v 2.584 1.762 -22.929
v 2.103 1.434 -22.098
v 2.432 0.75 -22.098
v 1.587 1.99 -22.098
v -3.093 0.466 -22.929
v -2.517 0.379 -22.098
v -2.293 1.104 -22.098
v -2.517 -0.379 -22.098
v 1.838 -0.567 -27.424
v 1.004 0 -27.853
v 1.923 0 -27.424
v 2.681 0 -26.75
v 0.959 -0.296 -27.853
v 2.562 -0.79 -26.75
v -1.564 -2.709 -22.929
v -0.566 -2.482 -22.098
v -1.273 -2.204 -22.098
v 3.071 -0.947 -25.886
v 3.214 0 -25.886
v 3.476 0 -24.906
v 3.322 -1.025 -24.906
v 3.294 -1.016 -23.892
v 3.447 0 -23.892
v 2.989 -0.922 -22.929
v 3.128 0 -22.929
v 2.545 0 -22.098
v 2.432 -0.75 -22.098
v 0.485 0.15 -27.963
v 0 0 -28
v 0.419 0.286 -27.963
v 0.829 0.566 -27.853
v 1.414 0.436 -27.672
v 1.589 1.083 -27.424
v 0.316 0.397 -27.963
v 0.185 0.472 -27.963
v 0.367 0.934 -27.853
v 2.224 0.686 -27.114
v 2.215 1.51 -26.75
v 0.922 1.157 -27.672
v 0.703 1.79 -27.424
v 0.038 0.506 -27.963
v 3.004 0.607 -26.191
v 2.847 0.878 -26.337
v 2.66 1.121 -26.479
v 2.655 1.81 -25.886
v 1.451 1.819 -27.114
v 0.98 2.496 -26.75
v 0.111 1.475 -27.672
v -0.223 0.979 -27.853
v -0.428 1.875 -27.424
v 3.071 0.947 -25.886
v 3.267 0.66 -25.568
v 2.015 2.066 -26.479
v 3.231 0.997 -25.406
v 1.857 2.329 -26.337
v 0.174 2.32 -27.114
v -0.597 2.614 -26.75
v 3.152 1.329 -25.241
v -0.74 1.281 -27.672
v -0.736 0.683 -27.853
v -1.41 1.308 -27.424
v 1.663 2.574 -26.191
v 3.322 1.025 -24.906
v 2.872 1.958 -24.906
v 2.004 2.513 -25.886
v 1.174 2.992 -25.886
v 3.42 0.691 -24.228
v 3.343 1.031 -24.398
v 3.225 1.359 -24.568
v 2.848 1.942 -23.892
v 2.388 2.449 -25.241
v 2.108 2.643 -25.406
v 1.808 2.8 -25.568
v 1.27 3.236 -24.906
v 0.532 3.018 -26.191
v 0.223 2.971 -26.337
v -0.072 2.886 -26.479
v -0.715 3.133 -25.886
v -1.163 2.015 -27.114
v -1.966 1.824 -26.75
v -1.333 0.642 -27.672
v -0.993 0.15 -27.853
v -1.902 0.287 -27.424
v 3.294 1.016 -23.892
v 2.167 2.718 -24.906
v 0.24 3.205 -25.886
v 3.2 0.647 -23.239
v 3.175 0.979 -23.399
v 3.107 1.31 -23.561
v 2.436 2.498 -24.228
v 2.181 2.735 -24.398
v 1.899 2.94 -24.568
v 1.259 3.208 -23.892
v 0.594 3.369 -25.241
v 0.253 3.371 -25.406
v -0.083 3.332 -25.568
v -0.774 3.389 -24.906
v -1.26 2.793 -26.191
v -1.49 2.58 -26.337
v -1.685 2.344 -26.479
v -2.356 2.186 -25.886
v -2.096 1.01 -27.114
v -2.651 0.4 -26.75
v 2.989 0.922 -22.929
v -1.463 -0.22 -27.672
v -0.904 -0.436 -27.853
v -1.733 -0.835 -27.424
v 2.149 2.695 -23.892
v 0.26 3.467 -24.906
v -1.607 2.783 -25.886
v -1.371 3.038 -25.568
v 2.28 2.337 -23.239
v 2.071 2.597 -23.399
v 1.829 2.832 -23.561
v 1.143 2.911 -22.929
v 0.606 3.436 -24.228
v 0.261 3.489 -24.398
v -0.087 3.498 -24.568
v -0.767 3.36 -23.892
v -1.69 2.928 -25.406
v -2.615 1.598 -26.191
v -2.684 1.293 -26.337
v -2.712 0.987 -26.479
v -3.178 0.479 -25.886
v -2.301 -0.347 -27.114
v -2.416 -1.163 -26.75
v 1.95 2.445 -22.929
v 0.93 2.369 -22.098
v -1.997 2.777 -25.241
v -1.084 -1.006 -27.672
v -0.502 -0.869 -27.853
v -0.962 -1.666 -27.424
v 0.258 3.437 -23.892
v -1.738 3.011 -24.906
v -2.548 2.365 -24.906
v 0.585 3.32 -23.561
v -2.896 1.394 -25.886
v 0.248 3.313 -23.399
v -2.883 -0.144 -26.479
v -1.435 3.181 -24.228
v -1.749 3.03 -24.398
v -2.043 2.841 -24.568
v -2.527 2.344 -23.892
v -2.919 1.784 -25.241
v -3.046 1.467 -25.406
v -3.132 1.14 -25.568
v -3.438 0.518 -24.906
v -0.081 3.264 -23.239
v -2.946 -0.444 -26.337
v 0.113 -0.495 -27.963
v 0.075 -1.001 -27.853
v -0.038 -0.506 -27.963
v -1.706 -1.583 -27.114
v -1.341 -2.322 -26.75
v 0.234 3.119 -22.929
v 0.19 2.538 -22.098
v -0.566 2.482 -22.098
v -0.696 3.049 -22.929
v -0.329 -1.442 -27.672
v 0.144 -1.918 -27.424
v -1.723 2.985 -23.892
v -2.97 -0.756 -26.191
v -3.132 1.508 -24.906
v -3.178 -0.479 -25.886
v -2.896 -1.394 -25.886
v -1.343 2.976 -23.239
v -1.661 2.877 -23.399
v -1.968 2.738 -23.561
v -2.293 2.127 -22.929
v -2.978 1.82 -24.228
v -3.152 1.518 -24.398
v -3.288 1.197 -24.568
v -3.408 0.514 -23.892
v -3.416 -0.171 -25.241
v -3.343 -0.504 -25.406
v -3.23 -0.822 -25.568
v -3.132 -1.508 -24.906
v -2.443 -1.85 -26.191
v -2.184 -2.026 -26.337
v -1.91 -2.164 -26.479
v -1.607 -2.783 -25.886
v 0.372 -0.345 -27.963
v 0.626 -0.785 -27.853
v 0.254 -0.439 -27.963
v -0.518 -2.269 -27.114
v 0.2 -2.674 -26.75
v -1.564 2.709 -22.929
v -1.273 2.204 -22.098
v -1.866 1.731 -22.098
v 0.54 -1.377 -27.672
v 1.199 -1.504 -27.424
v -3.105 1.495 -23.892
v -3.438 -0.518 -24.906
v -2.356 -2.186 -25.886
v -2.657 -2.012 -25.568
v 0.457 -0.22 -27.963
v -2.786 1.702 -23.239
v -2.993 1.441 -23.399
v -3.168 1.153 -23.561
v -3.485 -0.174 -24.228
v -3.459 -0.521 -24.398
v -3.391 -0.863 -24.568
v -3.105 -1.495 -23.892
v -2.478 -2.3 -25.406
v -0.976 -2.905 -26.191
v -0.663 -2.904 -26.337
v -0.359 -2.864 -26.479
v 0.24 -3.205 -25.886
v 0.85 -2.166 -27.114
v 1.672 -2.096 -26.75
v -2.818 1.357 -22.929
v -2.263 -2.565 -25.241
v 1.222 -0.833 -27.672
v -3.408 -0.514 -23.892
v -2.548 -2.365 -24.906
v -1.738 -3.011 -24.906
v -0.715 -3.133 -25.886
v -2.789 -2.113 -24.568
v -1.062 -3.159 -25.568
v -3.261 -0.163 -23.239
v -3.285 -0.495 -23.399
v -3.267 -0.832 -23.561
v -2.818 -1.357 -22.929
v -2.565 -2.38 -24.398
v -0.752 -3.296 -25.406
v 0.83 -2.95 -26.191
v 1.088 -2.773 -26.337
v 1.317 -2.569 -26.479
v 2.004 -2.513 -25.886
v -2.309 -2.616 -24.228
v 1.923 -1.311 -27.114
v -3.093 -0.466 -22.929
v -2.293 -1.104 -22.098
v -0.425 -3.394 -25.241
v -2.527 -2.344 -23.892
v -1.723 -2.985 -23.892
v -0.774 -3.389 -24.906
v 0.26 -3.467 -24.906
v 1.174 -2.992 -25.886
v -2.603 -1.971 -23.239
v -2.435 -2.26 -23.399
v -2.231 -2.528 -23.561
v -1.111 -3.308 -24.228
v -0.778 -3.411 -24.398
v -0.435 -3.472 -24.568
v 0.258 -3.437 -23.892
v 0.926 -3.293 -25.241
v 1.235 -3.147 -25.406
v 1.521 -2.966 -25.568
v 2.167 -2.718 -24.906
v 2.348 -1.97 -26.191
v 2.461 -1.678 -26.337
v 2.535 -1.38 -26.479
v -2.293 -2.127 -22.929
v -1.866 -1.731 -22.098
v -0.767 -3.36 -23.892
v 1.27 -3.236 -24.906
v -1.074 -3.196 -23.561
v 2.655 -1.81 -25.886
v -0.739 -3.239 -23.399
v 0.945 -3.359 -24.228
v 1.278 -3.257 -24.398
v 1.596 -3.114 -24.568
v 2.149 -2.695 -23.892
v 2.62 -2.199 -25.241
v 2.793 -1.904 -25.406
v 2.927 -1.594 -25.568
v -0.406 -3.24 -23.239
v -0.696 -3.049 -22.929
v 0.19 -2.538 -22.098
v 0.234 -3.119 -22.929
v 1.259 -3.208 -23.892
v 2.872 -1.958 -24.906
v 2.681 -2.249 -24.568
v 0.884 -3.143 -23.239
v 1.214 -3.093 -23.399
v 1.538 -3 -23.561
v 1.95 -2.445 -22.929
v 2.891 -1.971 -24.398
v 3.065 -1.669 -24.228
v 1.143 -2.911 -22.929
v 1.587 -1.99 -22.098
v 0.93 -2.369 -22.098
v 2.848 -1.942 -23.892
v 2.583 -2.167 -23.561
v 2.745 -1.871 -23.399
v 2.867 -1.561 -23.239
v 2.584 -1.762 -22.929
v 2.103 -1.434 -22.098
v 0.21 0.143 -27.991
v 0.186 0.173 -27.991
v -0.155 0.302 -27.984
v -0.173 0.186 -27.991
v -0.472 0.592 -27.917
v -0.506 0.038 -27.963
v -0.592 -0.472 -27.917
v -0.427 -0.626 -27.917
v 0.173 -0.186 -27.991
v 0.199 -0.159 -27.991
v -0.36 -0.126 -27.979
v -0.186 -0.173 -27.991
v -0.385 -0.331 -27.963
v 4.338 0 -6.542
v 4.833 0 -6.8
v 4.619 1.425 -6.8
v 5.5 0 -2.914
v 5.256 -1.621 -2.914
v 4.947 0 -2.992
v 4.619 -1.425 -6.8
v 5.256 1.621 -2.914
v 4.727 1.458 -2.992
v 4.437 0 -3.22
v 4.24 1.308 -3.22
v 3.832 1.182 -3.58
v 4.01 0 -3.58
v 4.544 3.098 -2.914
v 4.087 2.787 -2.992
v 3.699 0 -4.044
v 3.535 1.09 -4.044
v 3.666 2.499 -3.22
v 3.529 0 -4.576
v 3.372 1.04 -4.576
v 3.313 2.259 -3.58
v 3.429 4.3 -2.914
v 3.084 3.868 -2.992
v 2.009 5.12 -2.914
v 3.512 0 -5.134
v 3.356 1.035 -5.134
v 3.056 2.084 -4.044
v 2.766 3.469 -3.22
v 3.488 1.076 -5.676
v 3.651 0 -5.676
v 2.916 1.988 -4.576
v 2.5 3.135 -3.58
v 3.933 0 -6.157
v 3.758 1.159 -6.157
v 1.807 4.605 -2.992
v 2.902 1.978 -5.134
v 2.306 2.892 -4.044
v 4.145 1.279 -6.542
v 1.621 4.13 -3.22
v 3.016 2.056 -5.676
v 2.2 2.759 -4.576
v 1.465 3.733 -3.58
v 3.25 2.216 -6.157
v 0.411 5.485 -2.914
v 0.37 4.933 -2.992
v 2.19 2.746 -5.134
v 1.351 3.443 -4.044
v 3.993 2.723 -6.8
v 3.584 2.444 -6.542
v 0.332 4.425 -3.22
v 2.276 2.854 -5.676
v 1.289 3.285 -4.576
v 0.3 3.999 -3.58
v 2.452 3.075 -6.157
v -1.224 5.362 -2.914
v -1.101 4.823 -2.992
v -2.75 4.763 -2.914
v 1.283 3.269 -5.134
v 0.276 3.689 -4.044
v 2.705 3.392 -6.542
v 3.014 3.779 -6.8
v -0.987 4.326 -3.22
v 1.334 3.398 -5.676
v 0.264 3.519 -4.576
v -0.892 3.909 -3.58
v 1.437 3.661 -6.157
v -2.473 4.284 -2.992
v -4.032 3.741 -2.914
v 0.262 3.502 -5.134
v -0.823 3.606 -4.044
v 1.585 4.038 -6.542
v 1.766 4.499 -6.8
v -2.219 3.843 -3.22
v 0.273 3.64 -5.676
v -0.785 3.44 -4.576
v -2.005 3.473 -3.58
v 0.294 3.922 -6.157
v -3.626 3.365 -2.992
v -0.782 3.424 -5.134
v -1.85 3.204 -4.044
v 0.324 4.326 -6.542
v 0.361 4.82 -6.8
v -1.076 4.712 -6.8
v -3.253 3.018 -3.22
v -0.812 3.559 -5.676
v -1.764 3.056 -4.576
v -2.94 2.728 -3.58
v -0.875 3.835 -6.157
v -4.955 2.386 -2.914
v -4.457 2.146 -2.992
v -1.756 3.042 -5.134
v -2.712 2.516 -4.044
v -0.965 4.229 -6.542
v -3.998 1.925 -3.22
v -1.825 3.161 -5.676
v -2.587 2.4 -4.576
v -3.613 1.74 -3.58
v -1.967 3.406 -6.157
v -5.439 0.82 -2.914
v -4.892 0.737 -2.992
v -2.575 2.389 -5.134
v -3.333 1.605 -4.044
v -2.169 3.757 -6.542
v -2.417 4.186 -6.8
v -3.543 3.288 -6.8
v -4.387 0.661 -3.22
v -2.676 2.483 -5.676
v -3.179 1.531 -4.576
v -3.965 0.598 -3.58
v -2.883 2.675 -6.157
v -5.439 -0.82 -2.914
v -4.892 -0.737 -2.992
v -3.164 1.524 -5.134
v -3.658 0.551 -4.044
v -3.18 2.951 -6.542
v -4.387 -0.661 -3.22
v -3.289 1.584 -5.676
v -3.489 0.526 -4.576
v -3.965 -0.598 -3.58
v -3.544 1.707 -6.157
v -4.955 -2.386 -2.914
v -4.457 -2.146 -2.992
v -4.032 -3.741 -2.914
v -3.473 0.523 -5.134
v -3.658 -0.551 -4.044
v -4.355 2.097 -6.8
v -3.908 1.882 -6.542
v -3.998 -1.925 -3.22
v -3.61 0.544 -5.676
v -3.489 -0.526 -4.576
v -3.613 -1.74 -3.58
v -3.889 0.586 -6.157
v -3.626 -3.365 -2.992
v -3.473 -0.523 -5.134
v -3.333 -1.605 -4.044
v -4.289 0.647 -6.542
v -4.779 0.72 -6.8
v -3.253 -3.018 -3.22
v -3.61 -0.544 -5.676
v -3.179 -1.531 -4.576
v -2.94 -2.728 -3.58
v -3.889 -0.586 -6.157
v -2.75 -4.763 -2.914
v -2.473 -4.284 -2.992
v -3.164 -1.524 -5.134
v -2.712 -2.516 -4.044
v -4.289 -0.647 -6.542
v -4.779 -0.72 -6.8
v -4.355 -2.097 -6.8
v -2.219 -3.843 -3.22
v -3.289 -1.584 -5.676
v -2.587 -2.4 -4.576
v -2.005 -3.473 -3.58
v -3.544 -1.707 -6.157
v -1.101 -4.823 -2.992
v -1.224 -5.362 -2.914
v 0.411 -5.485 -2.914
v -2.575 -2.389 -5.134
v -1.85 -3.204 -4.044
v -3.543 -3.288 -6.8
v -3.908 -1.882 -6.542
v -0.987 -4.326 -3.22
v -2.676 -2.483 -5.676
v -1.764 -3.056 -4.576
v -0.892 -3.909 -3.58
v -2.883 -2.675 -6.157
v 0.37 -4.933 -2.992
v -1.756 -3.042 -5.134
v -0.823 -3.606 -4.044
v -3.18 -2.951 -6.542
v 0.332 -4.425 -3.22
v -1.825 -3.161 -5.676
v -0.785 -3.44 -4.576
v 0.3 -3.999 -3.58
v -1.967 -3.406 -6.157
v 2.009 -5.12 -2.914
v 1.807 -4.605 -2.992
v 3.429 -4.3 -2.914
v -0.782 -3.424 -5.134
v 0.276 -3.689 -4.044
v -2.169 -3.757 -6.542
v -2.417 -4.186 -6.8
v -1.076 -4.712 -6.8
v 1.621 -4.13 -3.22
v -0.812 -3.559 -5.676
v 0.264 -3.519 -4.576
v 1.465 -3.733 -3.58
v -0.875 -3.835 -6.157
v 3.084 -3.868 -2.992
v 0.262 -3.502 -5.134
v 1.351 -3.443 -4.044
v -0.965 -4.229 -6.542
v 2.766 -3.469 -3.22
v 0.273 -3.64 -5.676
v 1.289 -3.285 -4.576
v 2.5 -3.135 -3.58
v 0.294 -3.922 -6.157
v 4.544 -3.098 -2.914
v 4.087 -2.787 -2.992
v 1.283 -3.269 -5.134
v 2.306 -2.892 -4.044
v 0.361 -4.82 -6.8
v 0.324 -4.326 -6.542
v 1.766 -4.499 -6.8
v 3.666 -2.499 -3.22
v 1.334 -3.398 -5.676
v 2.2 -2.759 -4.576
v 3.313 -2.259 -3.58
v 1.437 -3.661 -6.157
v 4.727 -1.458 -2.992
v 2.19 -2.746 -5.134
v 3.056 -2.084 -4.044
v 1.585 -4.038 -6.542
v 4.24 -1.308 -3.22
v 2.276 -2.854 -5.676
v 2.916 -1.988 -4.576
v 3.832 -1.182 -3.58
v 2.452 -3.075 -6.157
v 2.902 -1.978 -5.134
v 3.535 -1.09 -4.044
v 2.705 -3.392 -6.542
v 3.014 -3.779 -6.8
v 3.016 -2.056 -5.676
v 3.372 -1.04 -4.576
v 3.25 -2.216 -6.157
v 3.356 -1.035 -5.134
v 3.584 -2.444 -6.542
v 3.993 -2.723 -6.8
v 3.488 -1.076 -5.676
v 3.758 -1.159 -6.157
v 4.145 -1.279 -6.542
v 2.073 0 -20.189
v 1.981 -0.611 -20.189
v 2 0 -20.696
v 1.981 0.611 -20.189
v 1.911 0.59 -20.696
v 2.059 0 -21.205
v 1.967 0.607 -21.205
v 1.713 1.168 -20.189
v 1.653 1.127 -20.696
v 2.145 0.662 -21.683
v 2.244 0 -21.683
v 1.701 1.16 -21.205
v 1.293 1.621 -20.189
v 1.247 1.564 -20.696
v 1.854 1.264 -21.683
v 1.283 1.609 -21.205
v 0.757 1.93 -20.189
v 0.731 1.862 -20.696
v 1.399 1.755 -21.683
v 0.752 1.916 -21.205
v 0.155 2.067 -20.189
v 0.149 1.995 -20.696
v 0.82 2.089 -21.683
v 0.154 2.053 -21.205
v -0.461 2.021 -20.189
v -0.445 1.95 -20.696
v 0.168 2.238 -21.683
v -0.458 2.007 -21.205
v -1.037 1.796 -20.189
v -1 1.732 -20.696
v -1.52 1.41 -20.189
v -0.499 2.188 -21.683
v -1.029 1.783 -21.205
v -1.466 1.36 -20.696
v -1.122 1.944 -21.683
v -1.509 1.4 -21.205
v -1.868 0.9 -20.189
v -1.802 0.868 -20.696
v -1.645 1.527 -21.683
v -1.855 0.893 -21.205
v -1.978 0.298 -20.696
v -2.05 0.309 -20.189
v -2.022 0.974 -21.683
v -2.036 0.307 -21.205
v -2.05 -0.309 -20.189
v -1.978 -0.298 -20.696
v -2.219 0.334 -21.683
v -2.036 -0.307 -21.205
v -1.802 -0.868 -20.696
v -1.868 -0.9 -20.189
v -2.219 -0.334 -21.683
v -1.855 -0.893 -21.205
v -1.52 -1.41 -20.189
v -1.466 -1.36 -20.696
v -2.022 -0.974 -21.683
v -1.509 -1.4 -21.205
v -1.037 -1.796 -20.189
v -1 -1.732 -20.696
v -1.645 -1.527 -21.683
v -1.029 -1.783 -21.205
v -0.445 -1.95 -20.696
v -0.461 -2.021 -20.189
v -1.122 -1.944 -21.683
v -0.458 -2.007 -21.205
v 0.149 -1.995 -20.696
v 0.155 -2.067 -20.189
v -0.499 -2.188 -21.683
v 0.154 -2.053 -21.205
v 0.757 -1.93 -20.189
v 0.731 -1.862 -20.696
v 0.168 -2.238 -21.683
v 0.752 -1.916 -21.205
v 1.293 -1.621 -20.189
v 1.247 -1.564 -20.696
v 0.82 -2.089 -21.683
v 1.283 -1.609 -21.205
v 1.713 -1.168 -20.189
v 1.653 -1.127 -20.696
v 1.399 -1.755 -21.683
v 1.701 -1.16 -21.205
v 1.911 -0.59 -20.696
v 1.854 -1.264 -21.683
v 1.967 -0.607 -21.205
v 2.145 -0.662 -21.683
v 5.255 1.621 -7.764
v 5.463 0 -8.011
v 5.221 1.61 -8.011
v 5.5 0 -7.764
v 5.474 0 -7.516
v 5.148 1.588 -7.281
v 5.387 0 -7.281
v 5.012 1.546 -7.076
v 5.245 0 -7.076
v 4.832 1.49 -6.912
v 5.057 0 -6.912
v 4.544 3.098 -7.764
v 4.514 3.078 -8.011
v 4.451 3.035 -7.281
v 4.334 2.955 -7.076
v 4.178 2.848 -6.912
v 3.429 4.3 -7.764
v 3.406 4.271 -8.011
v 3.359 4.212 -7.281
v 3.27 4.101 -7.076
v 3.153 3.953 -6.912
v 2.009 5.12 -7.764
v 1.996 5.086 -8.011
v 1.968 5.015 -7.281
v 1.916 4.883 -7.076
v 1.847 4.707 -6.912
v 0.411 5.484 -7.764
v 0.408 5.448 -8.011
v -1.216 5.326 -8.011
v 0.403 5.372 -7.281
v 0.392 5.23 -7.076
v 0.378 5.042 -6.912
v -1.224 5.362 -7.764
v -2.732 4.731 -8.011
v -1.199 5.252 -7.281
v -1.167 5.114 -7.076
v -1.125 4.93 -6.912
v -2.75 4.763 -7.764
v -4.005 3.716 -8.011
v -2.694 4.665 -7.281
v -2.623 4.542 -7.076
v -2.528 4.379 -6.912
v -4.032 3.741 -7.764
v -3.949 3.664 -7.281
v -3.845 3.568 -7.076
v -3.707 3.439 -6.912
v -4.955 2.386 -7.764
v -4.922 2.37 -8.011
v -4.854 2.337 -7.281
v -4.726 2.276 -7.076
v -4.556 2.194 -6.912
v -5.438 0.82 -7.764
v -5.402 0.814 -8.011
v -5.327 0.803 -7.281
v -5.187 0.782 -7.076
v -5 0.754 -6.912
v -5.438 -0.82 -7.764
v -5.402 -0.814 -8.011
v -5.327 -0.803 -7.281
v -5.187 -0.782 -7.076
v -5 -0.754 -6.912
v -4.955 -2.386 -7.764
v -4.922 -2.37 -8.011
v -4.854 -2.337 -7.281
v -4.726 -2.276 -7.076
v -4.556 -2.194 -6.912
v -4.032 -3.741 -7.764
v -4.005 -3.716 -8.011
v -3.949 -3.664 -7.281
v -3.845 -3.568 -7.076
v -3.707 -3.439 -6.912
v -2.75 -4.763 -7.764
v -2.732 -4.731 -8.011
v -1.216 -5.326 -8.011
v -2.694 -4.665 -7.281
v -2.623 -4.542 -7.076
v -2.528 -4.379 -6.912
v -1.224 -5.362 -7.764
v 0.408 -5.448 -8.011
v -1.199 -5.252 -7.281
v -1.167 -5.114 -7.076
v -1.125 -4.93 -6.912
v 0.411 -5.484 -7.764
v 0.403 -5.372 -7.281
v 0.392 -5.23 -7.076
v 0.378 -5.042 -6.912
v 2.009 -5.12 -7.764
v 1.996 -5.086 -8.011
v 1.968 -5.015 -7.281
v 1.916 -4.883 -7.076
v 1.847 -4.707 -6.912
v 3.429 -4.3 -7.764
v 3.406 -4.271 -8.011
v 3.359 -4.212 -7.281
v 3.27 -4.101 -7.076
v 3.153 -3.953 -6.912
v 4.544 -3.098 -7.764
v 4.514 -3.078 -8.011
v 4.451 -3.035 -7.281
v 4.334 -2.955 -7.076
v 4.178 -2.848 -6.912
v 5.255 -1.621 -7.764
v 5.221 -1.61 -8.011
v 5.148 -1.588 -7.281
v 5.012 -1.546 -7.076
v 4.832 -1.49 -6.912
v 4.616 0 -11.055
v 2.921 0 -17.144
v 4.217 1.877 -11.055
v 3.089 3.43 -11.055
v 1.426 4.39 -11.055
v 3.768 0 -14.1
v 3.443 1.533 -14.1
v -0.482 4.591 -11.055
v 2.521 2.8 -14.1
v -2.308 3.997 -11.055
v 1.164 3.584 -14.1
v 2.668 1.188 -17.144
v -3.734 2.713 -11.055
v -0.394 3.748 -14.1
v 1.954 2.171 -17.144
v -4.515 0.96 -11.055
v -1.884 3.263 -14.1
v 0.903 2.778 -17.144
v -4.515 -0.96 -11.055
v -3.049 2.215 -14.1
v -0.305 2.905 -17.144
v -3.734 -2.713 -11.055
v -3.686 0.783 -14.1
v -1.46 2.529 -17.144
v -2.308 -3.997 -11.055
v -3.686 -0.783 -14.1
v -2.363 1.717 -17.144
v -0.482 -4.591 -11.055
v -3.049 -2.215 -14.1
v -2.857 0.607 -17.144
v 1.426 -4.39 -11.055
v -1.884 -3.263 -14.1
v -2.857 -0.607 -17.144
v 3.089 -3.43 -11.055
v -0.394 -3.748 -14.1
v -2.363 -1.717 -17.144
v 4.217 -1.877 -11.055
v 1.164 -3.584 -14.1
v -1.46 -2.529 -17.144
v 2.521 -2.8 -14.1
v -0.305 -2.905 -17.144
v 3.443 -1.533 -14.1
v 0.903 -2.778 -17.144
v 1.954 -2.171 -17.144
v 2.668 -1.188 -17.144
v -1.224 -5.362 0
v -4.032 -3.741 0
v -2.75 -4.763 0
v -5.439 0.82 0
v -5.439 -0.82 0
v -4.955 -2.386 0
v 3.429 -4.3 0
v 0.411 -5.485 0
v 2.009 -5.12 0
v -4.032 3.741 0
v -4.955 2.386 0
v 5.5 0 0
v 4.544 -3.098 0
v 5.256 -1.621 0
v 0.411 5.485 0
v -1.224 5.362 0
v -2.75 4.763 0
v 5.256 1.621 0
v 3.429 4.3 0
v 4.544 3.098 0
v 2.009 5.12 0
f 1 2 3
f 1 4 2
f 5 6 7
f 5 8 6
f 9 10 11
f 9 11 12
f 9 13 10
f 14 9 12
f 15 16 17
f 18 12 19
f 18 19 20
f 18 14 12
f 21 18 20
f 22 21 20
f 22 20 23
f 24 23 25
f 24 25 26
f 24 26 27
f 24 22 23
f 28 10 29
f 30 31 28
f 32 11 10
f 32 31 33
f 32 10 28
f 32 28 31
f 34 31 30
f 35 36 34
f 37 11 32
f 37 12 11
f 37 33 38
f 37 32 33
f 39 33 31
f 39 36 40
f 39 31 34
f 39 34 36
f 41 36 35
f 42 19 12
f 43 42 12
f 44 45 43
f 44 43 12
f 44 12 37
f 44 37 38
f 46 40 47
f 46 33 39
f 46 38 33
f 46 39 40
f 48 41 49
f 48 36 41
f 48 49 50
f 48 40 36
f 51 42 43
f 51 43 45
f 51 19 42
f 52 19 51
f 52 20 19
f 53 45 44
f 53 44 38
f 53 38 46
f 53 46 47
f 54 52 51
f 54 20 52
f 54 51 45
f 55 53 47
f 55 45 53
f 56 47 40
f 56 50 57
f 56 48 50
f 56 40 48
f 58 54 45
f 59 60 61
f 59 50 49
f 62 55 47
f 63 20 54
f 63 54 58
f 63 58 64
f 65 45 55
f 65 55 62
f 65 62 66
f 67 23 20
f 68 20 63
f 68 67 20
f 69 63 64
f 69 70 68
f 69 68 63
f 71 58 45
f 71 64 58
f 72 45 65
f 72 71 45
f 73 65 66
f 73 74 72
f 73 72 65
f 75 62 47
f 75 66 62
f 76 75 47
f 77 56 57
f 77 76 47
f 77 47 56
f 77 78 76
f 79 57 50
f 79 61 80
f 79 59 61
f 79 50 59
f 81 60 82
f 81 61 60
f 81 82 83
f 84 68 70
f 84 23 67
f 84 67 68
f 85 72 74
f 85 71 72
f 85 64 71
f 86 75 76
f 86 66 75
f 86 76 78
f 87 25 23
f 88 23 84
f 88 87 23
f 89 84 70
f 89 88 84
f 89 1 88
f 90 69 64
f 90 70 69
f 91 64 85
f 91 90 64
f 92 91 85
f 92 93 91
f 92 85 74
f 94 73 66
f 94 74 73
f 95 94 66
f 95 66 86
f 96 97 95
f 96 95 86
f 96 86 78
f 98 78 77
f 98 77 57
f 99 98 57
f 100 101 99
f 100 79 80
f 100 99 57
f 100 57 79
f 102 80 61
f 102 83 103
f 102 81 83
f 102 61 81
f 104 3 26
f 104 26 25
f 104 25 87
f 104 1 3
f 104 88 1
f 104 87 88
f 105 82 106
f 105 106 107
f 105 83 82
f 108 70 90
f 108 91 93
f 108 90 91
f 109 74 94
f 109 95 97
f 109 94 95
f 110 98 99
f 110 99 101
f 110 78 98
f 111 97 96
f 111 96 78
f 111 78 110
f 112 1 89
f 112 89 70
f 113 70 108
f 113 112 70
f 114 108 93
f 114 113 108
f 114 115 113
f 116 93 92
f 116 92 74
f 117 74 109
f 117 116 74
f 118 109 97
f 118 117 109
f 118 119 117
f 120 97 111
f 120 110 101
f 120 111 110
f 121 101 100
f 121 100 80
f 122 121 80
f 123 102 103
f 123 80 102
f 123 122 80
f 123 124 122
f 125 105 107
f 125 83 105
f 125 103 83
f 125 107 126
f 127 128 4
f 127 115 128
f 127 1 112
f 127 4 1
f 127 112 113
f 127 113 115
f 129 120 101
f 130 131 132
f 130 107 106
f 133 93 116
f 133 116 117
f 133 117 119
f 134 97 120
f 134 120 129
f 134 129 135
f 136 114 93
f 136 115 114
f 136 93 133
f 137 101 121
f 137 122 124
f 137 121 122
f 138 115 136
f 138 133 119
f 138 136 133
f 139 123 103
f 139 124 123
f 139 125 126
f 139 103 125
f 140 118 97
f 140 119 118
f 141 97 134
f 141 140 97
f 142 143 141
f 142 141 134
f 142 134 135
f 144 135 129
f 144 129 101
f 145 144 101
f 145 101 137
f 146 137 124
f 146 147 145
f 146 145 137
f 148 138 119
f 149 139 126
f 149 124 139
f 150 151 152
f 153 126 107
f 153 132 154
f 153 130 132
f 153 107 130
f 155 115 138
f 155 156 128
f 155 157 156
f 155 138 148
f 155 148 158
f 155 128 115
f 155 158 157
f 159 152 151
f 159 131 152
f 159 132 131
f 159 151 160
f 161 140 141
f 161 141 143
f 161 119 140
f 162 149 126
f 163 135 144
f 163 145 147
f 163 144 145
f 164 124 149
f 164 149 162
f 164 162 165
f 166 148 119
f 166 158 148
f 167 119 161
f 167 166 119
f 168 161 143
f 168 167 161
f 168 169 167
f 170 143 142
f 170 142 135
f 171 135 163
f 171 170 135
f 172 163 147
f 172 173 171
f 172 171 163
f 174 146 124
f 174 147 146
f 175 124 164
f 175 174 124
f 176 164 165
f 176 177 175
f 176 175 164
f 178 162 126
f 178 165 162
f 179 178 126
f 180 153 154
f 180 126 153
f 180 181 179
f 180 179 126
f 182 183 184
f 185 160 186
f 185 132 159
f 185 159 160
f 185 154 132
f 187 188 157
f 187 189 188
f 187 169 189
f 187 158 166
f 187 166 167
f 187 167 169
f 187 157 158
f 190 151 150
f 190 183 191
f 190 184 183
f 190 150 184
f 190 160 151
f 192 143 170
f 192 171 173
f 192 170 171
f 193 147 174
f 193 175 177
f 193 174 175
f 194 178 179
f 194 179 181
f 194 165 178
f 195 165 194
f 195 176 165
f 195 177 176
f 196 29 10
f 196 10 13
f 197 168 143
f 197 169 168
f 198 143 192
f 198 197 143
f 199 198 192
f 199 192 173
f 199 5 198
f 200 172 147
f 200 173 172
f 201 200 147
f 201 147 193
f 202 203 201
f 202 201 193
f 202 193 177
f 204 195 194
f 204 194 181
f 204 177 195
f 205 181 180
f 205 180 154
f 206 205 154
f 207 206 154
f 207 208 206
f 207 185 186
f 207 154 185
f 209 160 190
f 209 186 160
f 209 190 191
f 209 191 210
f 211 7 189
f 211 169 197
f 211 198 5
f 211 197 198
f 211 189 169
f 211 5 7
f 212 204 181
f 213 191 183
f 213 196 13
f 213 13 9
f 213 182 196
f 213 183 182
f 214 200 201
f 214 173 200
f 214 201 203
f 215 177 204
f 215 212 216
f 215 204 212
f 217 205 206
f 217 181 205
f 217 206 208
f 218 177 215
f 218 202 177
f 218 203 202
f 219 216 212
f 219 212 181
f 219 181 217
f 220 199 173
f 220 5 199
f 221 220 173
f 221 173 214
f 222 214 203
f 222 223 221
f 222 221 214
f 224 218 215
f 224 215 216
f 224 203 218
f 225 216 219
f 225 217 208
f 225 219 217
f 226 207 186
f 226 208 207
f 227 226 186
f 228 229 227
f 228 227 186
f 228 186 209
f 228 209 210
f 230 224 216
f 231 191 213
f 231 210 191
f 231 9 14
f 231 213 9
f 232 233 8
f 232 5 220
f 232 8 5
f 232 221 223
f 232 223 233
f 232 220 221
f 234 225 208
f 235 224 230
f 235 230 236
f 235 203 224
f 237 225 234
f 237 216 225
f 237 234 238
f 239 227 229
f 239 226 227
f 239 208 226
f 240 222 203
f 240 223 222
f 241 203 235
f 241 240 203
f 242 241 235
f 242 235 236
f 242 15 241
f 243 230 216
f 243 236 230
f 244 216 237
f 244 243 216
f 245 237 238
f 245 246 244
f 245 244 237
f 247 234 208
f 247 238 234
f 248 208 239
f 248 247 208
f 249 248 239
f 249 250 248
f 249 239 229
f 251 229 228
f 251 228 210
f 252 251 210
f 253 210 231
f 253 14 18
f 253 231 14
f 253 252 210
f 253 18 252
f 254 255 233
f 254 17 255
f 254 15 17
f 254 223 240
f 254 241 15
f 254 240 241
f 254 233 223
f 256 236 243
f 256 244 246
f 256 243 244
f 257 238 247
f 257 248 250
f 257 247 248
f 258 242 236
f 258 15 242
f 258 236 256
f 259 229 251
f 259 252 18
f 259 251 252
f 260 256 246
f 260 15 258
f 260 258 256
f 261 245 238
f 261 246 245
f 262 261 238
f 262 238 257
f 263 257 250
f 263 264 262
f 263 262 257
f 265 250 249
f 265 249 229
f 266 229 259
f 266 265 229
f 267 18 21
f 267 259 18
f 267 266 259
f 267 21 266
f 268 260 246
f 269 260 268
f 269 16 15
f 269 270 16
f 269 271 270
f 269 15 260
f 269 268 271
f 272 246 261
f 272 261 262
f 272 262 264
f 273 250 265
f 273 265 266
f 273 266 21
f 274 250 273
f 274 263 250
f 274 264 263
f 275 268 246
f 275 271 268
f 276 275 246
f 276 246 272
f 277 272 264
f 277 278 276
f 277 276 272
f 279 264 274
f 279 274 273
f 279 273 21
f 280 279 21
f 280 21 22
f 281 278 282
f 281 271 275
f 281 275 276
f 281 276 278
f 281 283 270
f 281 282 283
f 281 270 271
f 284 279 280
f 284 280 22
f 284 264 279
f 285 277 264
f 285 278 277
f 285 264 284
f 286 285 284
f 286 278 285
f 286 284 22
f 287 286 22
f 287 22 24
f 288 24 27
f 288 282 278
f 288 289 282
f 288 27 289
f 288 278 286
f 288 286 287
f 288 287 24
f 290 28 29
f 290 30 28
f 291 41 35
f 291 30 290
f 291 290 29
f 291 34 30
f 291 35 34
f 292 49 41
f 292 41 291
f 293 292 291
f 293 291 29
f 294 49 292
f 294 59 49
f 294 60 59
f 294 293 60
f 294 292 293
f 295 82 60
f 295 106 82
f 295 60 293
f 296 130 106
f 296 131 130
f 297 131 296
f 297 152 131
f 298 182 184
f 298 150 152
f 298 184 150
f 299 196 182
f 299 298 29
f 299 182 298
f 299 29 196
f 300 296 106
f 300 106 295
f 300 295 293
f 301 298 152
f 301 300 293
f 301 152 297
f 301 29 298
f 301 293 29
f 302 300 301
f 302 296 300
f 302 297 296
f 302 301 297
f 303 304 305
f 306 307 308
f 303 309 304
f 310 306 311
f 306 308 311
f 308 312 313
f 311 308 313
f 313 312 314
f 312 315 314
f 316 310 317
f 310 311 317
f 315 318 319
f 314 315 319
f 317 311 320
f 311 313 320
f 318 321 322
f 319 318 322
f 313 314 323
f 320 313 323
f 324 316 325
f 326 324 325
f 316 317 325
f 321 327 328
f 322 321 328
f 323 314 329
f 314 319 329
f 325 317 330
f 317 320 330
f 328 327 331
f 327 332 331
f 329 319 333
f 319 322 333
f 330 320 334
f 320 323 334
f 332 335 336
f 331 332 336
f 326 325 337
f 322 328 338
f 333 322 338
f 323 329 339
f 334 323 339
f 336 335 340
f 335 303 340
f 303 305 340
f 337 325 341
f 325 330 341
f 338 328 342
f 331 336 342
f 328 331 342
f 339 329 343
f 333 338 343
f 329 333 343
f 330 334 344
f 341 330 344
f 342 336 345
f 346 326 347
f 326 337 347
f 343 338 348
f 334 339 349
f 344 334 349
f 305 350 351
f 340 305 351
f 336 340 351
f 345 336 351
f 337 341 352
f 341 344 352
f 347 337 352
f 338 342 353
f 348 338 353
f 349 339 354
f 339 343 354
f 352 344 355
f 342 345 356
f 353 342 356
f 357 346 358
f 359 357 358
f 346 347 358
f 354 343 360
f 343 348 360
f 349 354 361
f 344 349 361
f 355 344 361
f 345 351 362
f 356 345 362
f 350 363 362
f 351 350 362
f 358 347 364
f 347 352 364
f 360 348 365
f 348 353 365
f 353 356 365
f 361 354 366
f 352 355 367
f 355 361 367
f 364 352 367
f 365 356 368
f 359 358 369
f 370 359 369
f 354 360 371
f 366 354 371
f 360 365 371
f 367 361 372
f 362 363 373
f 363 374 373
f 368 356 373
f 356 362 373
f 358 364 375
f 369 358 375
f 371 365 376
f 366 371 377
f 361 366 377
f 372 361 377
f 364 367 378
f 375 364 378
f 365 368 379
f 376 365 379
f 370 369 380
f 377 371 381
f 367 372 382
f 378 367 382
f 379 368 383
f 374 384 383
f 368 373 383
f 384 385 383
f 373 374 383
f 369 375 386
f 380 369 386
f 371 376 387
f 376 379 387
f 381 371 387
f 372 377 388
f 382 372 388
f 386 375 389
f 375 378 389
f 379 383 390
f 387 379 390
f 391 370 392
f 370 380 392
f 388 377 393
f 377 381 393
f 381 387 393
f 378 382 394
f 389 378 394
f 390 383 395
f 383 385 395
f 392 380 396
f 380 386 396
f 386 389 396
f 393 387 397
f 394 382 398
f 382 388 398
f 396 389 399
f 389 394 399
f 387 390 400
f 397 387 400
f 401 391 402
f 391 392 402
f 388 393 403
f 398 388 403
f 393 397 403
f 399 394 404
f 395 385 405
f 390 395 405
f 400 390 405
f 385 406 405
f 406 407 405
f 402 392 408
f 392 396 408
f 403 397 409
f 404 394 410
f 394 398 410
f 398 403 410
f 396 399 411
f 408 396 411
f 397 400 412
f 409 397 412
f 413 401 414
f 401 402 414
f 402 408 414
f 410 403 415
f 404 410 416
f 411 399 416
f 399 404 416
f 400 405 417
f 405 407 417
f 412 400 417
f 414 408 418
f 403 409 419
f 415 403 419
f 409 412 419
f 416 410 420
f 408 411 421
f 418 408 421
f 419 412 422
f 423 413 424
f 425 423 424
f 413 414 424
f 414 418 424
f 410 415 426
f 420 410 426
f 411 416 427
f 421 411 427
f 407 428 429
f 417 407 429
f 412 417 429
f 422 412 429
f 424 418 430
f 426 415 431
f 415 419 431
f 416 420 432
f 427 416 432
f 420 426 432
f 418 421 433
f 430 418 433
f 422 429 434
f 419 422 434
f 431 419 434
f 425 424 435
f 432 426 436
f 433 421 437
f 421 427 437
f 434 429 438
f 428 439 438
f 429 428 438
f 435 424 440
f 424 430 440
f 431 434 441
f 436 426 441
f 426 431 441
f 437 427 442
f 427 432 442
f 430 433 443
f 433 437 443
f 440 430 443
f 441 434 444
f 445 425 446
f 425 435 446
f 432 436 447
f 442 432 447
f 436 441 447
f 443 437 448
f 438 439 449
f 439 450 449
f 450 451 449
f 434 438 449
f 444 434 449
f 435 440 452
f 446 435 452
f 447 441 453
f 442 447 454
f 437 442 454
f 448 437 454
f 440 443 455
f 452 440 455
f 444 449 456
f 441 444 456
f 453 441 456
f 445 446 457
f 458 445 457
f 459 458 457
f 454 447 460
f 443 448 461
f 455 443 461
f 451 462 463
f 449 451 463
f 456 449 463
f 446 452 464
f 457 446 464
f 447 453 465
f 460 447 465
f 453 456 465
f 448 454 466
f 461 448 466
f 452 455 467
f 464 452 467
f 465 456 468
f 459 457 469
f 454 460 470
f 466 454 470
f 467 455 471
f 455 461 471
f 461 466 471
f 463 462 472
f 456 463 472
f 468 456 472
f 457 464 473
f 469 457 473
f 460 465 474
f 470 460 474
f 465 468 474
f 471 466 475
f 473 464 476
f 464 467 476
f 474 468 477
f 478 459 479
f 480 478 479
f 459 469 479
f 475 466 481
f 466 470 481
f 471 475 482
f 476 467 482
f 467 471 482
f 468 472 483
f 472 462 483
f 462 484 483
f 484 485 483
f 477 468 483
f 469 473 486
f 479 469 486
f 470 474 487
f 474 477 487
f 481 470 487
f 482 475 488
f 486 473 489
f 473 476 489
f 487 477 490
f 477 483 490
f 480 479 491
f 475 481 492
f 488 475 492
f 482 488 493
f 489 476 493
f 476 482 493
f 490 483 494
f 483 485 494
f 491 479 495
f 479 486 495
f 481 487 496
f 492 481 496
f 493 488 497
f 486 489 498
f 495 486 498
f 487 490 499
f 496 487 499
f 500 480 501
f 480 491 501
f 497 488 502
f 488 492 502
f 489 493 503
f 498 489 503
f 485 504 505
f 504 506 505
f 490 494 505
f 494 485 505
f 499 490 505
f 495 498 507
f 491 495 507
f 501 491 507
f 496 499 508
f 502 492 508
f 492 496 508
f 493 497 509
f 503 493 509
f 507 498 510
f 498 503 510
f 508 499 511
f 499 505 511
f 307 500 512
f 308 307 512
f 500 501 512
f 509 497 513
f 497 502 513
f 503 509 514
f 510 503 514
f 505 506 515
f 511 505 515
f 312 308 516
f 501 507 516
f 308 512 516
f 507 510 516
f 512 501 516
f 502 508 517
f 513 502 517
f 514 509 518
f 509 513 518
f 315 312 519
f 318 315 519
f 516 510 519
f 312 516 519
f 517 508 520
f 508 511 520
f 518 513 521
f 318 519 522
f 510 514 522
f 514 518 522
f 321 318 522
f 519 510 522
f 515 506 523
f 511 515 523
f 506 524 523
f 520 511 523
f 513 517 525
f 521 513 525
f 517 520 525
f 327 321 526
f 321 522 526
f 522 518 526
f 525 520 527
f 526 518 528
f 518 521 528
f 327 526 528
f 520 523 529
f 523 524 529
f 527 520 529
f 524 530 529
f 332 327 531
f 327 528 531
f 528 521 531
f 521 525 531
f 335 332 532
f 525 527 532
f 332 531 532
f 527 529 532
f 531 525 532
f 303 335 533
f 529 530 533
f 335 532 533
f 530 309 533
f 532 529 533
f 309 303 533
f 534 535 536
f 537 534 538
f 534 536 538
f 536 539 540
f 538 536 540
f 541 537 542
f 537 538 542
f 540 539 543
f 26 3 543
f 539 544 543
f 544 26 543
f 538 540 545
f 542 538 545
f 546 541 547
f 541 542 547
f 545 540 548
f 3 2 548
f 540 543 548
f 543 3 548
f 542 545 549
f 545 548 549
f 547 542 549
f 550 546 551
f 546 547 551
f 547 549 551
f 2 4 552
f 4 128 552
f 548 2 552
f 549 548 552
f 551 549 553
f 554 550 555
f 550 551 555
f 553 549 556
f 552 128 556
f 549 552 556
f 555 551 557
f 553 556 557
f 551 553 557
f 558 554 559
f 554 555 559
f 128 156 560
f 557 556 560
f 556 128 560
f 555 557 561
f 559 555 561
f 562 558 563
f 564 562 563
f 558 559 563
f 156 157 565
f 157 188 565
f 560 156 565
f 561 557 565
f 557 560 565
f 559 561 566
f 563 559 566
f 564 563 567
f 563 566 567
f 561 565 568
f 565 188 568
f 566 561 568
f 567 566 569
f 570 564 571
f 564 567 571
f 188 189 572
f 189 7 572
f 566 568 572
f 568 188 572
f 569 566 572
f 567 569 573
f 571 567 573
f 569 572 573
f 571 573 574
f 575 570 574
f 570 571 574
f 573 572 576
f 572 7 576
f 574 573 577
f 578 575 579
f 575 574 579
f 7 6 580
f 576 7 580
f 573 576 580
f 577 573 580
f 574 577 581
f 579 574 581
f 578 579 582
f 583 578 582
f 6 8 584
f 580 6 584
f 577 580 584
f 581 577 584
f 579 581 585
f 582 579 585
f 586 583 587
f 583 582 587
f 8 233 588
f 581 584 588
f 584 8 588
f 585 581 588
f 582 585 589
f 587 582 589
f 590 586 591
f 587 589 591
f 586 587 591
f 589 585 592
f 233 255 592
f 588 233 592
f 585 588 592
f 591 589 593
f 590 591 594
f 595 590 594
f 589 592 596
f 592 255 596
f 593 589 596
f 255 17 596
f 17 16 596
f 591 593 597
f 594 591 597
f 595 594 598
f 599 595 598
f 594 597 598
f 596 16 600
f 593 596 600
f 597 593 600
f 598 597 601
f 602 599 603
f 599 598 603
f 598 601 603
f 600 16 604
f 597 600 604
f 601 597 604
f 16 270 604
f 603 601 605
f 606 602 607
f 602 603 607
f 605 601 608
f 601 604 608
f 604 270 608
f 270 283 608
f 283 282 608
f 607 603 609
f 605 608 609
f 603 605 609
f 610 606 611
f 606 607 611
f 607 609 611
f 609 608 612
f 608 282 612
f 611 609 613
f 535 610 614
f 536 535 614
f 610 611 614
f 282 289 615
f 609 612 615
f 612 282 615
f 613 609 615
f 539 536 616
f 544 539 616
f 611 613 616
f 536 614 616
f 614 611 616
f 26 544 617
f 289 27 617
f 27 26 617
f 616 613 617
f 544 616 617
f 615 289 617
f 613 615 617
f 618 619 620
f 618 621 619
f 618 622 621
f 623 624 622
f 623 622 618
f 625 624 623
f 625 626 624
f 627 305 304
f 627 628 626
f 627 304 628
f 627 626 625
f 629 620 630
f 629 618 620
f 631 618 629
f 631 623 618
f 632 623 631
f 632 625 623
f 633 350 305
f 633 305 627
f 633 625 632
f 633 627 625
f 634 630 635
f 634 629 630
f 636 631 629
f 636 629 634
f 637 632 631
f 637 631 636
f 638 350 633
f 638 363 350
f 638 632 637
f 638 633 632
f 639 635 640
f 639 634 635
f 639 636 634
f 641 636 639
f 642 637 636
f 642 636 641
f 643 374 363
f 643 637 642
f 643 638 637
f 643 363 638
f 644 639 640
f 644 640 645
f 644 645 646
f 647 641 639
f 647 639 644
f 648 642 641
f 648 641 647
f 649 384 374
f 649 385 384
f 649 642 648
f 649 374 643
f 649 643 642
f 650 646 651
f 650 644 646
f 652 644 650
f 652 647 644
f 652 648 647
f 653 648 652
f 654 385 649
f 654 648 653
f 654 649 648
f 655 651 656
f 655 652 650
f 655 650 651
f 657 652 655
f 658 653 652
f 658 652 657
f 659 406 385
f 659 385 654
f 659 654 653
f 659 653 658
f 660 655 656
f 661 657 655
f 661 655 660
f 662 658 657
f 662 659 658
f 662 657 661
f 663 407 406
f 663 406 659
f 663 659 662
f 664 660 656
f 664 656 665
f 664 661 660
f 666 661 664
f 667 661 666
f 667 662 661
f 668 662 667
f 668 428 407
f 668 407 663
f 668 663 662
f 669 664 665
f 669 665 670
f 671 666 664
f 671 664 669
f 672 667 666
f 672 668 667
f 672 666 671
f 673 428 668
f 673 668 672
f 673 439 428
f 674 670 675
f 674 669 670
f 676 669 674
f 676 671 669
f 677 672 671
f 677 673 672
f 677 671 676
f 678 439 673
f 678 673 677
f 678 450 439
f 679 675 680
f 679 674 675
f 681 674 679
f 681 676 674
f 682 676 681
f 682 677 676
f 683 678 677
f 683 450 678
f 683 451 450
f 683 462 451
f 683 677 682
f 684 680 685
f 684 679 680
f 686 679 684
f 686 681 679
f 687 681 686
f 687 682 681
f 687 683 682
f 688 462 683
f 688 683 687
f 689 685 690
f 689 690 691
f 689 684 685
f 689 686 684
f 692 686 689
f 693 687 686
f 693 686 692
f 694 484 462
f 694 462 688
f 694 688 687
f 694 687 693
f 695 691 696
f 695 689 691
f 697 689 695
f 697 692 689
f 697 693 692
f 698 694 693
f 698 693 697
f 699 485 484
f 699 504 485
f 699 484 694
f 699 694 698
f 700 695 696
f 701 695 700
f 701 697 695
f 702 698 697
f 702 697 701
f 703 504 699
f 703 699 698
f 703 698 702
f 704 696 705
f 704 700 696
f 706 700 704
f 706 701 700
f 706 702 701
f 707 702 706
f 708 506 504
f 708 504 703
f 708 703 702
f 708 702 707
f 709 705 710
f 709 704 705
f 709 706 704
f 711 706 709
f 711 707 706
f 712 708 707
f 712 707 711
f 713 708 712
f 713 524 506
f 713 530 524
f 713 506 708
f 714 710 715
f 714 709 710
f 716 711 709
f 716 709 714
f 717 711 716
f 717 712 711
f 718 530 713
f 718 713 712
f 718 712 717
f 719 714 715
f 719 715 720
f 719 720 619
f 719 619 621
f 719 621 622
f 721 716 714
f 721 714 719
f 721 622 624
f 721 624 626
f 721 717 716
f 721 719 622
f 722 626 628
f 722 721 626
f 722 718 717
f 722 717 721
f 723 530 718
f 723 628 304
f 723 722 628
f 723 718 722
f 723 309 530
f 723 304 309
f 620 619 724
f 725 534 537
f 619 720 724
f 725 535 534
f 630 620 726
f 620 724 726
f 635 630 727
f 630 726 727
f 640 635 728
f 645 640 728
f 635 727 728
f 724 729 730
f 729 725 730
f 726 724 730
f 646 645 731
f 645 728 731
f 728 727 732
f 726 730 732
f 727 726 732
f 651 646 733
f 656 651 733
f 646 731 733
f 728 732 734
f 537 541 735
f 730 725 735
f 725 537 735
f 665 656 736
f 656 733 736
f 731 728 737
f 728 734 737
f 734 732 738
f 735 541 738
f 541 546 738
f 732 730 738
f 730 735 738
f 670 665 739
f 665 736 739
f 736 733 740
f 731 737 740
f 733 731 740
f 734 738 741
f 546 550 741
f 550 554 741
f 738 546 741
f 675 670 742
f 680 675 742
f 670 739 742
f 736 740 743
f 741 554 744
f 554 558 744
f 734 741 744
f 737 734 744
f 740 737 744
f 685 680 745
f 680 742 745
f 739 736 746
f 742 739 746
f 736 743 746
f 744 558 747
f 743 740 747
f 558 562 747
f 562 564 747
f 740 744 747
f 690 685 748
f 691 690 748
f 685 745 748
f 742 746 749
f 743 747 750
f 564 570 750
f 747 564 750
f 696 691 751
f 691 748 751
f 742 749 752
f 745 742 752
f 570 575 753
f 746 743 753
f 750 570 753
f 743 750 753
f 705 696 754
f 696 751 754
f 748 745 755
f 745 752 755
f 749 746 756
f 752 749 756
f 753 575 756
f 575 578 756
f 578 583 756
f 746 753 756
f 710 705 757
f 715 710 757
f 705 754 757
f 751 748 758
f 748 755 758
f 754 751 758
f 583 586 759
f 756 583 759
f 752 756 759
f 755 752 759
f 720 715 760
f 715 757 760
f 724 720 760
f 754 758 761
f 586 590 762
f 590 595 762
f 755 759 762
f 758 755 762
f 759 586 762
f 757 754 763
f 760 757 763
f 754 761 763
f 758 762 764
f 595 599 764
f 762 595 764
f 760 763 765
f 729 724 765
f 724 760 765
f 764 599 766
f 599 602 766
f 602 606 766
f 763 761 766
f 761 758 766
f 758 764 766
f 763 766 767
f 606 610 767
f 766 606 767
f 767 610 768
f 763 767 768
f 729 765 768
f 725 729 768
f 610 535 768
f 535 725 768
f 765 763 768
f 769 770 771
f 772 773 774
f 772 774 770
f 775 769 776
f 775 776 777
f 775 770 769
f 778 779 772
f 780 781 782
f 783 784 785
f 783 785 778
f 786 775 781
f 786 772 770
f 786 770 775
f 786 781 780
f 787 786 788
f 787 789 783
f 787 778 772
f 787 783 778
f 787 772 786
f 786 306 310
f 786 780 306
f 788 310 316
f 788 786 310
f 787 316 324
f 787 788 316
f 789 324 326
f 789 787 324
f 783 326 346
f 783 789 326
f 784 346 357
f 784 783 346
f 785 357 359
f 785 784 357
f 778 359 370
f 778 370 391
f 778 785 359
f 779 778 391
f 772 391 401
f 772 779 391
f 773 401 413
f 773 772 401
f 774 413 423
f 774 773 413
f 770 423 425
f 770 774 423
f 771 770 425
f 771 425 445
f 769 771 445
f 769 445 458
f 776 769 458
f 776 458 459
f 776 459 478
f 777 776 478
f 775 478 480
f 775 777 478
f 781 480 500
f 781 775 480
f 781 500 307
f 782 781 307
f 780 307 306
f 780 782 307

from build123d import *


with BuildPart() as part:
    # Sketch → Revolution (revolve)
    with BuildSketch(Plane.XZ):
        with BuildLine():
            Line((0, 0), (0, -28))
            ThreePointArc((0, -28), (3.213858, -25.886043), (2.545455, -22.09778))
            ThreePointArc((2.073267, -20.188708), (2.058505, -21.20529), (2.545455, -22.09778))
            Line((5.463367, -8.010997), (2.073267, -20.188708))
            ThreePointArc((5.463367, -8.010997), (5.387122, -7.281275), (4.833333, -6.8))
            ThreePointArc((5.5, -2.914382), (3.528803, -4.576178), (4.833333, -6.8))
            Line((5.5, -2.914382), (5.5, 0))
            Line((5.5, 0), (0, 0))
        make_face()
    revolve(axis=Axis((0, 0, 0), (0, 0, 1)))


solid = part.part
